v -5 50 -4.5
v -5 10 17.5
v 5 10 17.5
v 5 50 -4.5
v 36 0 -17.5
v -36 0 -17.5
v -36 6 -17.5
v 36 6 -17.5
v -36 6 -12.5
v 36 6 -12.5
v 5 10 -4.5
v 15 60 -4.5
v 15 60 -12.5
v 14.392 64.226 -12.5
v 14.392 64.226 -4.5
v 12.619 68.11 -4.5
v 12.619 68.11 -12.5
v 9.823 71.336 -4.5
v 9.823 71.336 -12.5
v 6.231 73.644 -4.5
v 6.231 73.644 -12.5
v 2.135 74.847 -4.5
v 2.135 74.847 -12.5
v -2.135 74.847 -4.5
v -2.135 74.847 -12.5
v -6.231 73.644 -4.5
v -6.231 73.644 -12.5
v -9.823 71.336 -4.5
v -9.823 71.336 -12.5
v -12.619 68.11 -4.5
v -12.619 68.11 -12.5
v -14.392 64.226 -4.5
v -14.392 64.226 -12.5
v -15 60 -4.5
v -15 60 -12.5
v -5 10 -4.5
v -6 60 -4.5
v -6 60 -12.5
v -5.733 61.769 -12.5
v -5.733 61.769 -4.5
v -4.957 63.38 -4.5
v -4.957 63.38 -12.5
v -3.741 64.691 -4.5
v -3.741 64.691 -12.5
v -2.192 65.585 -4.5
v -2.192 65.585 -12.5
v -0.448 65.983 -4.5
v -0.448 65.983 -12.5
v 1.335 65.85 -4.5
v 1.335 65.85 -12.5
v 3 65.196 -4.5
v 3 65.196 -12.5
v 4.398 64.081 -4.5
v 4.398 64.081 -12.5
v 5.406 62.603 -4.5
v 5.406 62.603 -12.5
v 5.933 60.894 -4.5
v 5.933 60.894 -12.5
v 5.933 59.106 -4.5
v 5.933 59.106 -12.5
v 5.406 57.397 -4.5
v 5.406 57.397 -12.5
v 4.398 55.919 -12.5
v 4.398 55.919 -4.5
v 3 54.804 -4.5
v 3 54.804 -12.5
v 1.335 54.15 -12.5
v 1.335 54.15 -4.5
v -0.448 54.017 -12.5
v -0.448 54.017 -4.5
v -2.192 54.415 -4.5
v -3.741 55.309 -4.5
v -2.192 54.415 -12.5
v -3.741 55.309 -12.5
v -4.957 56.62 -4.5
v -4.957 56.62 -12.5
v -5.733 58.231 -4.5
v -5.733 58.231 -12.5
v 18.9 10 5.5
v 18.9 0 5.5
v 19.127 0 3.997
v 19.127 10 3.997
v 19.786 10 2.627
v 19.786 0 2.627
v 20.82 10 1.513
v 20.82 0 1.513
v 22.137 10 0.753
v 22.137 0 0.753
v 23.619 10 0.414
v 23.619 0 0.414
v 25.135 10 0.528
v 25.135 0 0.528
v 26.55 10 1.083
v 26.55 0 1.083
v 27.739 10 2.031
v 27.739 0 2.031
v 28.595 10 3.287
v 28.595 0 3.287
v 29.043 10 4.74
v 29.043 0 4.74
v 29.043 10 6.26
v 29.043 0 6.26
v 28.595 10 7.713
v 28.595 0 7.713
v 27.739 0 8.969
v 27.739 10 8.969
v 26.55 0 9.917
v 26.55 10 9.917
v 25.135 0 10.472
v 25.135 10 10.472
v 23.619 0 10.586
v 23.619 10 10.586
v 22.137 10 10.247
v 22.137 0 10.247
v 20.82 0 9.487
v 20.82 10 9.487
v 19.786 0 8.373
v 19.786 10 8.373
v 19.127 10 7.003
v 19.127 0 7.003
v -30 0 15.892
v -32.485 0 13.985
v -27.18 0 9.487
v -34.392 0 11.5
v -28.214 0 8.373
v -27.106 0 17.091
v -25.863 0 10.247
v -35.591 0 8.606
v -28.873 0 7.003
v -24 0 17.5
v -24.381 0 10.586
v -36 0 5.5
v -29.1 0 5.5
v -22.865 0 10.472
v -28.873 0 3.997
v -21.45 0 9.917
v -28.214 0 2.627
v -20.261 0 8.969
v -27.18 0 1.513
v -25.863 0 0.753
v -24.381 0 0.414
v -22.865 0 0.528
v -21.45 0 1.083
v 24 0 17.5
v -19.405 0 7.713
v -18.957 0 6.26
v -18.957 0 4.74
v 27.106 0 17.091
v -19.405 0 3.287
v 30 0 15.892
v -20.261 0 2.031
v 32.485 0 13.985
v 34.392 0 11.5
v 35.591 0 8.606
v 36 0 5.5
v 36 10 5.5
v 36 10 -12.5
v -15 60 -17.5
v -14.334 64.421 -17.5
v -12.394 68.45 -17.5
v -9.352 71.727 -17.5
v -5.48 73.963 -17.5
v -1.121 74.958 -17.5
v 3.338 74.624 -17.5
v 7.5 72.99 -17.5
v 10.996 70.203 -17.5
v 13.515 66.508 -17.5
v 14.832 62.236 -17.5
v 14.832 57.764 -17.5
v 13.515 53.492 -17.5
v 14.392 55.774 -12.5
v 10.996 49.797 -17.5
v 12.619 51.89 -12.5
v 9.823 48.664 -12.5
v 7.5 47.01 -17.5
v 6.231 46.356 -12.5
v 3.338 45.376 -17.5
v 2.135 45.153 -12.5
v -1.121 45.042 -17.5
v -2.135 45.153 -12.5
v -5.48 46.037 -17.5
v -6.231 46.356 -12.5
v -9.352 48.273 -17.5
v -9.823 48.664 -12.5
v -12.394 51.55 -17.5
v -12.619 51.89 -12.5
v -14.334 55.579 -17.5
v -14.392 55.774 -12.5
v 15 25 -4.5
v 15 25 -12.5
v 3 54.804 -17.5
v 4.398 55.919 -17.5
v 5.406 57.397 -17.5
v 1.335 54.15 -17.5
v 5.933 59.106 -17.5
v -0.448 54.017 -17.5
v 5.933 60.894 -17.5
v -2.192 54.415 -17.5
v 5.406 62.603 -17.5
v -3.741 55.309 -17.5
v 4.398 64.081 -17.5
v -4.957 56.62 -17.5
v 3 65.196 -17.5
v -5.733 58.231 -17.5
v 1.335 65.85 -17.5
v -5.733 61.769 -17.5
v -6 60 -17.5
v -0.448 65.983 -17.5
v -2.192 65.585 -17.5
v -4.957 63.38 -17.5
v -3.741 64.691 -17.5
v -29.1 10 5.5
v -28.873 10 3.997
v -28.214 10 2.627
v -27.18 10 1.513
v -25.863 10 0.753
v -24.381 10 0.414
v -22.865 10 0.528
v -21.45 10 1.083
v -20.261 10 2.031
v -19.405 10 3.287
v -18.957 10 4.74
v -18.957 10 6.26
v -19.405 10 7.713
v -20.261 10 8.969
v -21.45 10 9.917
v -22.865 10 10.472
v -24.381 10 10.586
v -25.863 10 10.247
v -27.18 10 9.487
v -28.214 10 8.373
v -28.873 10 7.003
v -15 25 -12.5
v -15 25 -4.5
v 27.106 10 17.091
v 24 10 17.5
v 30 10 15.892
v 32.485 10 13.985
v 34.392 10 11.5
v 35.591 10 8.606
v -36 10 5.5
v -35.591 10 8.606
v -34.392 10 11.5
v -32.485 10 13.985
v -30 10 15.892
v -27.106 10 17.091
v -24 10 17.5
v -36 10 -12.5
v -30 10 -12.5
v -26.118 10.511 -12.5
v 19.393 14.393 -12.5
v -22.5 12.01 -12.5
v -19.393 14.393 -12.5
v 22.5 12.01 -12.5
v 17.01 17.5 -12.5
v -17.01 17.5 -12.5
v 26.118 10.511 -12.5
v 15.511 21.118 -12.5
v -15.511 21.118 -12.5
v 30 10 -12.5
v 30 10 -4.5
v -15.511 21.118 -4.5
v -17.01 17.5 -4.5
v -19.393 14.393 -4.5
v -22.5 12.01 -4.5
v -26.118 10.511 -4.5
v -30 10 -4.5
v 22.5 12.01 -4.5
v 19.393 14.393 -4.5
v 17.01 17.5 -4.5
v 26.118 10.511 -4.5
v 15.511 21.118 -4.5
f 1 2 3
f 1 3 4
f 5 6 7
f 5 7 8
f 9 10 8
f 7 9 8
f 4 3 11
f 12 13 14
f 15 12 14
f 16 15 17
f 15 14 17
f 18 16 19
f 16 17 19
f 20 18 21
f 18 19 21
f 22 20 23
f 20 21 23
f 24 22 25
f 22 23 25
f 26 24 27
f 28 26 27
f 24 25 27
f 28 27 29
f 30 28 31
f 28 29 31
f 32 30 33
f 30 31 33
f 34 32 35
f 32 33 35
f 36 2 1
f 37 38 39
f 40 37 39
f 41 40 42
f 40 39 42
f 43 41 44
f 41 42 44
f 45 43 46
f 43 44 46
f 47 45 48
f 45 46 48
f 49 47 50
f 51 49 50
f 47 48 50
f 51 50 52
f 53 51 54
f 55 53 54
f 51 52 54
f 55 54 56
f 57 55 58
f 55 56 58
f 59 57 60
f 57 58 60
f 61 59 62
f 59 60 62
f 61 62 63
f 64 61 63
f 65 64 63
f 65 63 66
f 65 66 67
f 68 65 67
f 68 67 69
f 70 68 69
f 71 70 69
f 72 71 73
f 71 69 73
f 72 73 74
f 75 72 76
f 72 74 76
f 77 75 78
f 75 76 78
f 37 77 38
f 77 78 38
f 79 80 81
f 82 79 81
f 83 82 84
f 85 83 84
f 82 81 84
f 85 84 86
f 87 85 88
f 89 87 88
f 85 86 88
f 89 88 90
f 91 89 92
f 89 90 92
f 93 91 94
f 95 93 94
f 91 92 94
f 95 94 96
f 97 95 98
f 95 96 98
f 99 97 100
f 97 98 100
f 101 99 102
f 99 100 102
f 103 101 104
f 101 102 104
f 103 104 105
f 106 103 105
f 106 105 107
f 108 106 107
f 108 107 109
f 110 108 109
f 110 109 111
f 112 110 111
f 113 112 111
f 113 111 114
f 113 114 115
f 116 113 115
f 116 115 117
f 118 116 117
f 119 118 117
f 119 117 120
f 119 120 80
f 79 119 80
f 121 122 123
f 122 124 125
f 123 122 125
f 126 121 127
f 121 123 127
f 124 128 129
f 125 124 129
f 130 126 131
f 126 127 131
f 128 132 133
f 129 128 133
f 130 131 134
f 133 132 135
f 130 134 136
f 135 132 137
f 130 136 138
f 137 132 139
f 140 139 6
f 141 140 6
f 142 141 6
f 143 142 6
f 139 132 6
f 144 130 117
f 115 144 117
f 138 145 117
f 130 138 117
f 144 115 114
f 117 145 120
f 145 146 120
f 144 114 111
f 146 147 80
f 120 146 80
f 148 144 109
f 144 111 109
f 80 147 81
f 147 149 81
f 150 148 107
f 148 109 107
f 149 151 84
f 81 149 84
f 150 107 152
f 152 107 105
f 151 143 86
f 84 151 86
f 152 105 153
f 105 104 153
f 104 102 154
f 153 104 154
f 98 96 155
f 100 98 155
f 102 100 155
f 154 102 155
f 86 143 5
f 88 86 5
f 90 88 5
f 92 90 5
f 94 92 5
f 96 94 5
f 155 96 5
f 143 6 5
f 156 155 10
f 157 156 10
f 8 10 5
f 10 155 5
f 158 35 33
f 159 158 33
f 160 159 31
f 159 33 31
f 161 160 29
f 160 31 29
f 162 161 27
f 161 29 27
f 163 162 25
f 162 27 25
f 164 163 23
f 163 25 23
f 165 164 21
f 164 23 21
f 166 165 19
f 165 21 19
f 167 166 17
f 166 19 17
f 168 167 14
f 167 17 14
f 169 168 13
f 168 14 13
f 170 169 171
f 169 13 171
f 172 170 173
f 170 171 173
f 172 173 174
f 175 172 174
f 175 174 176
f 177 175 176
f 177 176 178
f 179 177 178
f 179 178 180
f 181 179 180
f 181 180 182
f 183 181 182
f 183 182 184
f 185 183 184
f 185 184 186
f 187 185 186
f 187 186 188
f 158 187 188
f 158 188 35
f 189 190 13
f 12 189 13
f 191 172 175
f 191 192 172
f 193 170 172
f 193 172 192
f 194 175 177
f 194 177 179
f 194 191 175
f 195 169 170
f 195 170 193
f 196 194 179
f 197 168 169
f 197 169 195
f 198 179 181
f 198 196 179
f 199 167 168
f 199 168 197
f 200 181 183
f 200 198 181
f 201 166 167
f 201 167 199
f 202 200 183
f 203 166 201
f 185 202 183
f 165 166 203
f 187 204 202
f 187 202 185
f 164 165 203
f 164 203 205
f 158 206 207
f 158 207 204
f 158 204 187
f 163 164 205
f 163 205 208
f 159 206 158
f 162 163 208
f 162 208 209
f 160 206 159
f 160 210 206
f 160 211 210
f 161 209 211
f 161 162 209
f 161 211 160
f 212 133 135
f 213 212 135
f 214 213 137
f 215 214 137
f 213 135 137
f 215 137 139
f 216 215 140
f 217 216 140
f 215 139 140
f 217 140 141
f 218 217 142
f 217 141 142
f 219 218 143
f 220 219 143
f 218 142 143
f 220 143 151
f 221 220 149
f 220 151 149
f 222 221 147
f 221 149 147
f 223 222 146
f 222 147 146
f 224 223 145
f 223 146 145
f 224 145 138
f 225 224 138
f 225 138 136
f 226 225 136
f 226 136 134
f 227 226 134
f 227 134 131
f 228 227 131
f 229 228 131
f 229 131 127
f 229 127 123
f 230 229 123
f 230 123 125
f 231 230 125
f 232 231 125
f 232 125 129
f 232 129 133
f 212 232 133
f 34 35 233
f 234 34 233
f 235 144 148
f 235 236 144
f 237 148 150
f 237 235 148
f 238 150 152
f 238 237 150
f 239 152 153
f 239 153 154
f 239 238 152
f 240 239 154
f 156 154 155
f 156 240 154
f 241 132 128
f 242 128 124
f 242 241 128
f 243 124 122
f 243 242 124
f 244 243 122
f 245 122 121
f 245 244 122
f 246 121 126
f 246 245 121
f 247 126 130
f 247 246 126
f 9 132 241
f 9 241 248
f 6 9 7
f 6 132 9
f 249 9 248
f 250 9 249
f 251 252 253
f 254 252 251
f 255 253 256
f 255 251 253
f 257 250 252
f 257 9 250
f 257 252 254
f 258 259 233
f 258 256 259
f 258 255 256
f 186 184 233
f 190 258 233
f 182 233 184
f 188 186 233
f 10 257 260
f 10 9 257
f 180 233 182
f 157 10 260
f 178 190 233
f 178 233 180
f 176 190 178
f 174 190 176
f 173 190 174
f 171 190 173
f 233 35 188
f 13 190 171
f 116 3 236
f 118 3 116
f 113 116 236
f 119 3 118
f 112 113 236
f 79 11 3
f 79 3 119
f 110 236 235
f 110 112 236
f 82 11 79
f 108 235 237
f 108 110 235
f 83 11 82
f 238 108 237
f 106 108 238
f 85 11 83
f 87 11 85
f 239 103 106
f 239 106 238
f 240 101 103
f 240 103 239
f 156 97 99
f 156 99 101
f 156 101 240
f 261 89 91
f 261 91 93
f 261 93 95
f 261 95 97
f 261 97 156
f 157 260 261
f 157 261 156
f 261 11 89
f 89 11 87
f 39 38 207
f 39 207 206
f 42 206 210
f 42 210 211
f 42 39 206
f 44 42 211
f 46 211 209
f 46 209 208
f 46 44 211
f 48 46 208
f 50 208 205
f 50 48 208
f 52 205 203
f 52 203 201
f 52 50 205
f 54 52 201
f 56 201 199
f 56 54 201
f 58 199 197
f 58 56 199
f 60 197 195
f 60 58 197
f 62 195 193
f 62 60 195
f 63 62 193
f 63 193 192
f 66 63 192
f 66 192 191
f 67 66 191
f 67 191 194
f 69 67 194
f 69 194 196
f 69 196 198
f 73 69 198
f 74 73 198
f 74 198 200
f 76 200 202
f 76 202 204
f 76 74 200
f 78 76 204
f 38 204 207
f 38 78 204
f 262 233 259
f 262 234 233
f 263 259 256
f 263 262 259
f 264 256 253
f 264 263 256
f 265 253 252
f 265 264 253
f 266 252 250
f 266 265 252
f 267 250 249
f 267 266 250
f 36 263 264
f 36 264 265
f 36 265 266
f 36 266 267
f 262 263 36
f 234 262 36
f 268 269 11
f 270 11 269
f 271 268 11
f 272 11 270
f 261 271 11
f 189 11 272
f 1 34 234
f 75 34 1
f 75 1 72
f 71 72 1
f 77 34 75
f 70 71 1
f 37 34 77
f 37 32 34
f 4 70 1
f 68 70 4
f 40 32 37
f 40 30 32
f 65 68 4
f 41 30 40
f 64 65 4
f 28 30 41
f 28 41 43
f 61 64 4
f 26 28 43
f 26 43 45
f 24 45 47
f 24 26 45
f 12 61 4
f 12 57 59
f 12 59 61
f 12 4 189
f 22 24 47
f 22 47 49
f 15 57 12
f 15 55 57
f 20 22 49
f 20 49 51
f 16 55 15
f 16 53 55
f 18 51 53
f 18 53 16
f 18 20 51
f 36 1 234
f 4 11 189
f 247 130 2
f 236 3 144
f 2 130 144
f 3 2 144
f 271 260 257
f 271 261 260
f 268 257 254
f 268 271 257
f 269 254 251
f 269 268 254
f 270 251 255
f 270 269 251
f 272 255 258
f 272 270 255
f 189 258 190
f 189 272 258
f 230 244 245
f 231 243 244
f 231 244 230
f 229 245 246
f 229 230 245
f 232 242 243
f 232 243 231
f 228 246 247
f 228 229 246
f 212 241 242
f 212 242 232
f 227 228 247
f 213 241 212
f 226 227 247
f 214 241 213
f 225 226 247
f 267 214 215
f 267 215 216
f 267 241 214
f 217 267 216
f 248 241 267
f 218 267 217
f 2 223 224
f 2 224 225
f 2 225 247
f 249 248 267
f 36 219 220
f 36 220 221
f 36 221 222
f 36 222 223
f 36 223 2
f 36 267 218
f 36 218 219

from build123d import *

# Parameters (mm, degrees)
SKETCH1_W           = 72
SKETCH1_H           = 35
BOSS_EXTRUDE1_DEPTH = 10
FILLET1_R           = 12
SKETCH2_W           = 5
SKETCH2_H           = 4
CUT_EXTRUDE1_DEPTH  = 75.767974428
SKETCH3_R           = 6
BOSS_EXTRUDE2_DEPTH = 8
FILLET2_R           = 15
FILLET3_R           = 15
M12_TAPPED_HOLE1_D  = 10.2
SKETCH7_R           = 15
SKETCH7_R_2         = 6
BOSS_EXTRUDE3_DEPTH = 5
RIB1_REACH          = 87.013
SKETCH8_WALL_W      = 217.67731737
SKETCH8_WALL_H      = 10


with BuildPart() as part:
    # Sketch1 → Boss-Extrude1 (new body)
    with BuildSketch(Plane(origin=(0, 0, 0), x_dir=(1, 0, 0), z_dir=(0, 1, 0))):
        Rectangle(SKETCH1_W, SKETCH1_H)
    extrude(amount=BOSS_EXTRUDE1_DEPTH)

    # Fillet1
    fillet1_edges = [part.edges().sort_by_distance(p)[0] for p in [
        (36, 5, 17.5),
        (-36, 5, 17.5),
    ]]
    fillet(fillet1_edges, radius=FILLET1_R)

    # Sketch2 → Cut-Extrude1 (cut, through all)
    with BuildSketch(Plane(origin=(36, 0, 0), x_dir=(0, 0, -1), z_dir=(1, 0, 0))):
        with Locations((15, 8)):
            Rectangle(SKETCH2_W, SKETCH2_H)
    extrude(amount=-CUT_EXTRUDE1_DEPTH, mode=Mode.SUBTRACT)

    # Sketch3 → Boss-Extrude2 (add)
    with BuildSketch(Plane(origin=(0, 0, -12.5), x_dir=(-1, 0, 0), z_dir=(0, 0, -1))):
        with BuildLine():
            Line((15, 10), (-15, 10))
            Line((-15, 10), (-15, 60))
            ThreePointArc((-15, 60), (0, 75), (15, 60))
            Line((15, 60), (15, 10))
        make_face()
        with Locations((0, 60)):
            Circle(SKETCH3_R, mode=Mode.SUBTRACT)
    extrude(amount=-BOSS_EXTRUDE2_DEPTH)

    # Fillet2
    fillet2_edges = [part.edges().sort_by_distance(p)[0] for p in [
        (15, 10, -8.5),
    ]]
    fillet(fillet2_edges, radius=FILLET2_R)

    # Fillet3
    fillet3_edges = [part.edges().sort_by_distance(p)[0] for p in [
        (-15, 10, -8.5),
    ]]
    fillet(fillet3_edges, radius=FILLET3_R)

    # M12 Tapped Hole1 (through all)
    with Locations(Plane(origin=(0, 10, 0), x_dir=(1, 0, 0), z_dir=(0, 1, 0))):
        with Locations((24, -5.5), (-24, -5.5)):
            Hole(M12_TAPPED_HOLE1_D / 2)

    # Sketch7 → Boss-Extrude3 (add)
    with BuildSketch(Plane(origin=(0, 0, -12.5), x_dir=(-1, 0, 0), z_dir=(0, 0, -1))):
        with Locations((0, 60)):
            Circle(SKETCH7_R)
        with Locations((0, 60)):
            Circle(SKETCH7_R_2, mode=Mode.SUBTRACT)
    extrude(amount=BOSS_EXTRUDE3_DEPTH)

    # Sketch8 wall → Rib1 (add, up to next)
    with BuildSketch(Plane(origin=(0, 30, 6.5), x_dir=(0, 0.876215908677, -0.481918749772), z_dir=(0, 0.481918749772, 0.876215908677)), mode=Mode.PRIVATE) as rib1_sk1:
        Rectangle(SKETCH8_WALL_W, SKETCH8_WALL_H)
    rib1_tool1 = extrude(rib1_sk1.sketch, amount=-RIB1_REACH, mode=Mode.PRIVATE) - part.part
    add(rib1_tool1.solids().sort_by_distance((0, 30, 6.5))[0])


solid = part.part
